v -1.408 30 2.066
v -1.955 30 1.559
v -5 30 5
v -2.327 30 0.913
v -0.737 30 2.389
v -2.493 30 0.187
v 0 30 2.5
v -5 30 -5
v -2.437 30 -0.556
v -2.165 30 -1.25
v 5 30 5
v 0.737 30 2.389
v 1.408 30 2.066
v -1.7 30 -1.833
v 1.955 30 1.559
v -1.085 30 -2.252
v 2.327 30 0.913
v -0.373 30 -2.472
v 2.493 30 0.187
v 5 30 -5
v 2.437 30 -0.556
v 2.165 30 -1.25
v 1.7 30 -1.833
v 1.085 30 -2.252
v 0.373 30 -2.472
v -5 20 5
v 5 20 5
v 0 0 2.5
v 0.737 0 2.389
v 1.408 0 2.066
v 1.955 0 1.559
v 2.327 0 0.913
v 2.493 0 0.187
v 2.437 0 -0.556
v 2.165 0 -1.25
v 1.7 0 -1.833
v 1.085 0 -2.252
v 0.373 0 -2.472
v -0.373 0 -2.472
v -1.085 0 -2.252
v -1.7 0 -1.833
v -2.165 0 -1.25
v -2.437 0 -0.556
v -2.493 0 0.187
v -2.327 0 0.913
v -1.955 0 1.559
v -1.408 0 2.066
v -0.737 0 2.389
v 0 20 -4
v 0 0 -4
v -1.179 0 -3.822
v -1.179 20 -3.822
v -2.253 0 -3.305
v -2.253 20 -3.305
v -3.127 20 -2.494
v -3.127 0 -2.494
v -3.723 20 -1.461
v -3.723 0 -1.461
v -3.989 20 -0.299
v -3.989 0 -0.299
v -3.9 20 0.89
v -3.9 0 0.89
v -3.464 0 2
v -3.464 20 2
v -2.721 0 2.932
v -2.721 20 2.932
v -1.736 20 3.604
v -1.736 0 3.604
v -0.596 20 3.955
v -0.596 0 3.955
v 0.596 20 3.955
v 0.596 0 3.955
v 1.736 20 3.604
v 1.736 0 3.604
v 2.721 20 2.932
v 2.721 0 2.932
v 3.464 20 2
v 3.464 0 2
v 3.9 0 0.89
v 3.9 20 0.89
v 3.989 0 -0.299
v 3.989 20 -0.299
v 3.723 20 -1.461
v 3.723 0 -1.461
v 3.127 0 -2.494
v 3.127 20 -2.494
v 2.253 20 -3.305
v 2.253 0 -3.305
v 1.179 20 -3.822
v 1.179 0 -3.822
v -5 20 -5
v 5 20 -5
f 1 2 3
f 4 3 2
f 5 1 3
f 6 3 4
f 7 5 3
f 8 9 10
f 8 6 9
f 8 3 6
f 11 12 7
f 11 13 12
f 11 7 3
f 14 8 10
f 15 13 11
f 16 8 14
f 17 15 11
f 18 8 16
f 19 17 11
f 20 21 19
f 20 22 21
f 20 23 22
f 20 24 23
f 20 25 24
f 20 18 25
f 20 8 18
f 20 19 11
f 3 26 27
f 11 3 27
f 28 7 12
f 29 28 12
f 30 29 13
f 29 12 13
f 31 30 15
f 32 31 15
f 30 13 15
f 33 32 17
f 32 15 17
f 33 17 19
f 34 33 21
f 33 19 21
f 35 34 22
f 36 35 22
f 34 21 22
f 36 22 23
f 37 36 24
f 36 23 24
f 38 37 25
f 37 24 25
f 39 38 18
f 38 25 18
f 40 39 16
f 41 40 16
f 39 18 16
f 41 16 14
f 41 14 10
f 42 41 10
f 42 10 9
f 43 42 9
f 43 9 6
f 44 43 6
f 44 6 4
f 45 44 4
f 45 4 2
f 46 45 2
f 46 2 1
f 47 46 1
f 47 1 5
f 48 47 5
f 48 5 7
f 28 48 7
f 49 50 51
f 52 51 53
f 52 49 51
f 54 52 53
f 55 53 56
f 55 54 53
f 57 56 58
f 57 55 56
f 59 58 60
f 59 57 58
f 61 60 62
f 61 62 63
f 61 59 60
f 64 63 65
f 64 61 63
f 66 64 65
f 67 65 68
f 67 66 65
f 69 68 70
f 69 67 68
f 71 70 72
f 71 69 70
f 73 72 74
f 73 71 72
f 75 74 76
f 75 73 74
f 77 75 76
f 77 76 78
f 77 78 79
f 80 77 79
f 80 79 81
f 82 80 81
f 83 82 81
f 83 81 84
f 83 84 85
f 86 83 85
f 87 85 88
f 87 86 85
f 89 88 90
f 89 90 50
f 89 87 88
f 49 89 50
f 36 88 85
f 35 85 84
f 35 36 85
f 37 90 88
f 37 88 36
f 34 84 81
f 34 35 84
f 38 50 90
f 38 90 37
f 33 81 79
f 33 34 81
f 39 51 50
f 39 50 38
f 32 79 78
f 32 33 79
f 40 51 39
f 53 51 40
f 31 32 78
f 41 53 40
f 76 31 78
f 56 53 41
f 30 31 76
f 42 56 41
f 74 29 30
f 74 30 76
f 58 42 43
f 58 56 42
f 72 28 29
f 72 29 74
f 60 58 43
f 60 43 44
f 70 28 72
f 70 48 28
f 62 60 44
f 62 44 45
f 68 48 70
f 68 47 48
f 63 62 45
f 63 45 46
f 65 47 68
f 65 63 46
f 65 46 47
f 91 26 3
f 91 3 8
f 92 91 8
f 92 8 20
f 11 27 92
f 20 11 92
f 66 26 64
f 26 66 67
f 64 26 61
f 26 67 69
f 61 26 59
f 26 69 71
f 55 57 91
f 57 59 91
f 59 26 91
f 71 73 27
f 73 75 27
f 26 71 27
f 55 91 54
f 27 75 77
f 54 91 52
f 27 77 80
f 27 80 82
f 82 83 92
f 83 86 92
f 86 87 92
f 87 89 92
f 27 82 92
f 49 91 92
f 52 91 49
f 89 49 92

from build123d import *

# Parameters (mm, degrees)
SKIZZE1_W                       = 4
SKIZZE1_H                       = 20
SKIZZE5_W                       = 10
SKIZZE5_H                       = 10
AUFSATZ_LINEAR_AUSTRAGEN1_DEPTH = 10
SKETCH1_R                       = 2.5
CUT_EXTRUDE1_DEPTH              = 31.822070015


with BuildPart() as part:
    # Skizze1 → Rotation1 (revolve)
    with BuildSketch(Plane.XY, mode=Mode.PRIVATE) as rotation1_sk:
        with Locations((2, 10)):
            Rectangle(SKIZZE1_W, SKIZZE1_H)
    revolve(rotation1_sk.sketch.rotate(Axis((0, -2.459302686, 0), (0, 1, 0)), 90), axis=Axis((0, -2.459302686, 0), (0, 1, 0)))

    # Skizze5 → Aufsatz-Linear austragen1 (add)
    with BuildSketch(Plane(origin=(0, 20, 0), x_dir=(1, 0, 0), z_dir=(0, 1, 0))):
        Rectangle(SKIZZE5_W, SKIZZE5_H)
    extrude(amount=AUFSATZ_LINEAR_AUSTRAGEN1_DEPTH)

    # Sketch1 → Cut-Extrude1 (cut, through all)
    with BuildSketch(Plane(origin=(0, 30, 0), x_dir=(1, 0, 0), z_dir=(0, 1, 0))):
        with Locations(Location((0, 0, 0), (0, 0, 270))):
            Circle(SKETCH1_R)
    extrude(amount=-CUT_EXTRUDE1_DEPTH, mode=Mode.SUBTRACT)


solid = part.part
